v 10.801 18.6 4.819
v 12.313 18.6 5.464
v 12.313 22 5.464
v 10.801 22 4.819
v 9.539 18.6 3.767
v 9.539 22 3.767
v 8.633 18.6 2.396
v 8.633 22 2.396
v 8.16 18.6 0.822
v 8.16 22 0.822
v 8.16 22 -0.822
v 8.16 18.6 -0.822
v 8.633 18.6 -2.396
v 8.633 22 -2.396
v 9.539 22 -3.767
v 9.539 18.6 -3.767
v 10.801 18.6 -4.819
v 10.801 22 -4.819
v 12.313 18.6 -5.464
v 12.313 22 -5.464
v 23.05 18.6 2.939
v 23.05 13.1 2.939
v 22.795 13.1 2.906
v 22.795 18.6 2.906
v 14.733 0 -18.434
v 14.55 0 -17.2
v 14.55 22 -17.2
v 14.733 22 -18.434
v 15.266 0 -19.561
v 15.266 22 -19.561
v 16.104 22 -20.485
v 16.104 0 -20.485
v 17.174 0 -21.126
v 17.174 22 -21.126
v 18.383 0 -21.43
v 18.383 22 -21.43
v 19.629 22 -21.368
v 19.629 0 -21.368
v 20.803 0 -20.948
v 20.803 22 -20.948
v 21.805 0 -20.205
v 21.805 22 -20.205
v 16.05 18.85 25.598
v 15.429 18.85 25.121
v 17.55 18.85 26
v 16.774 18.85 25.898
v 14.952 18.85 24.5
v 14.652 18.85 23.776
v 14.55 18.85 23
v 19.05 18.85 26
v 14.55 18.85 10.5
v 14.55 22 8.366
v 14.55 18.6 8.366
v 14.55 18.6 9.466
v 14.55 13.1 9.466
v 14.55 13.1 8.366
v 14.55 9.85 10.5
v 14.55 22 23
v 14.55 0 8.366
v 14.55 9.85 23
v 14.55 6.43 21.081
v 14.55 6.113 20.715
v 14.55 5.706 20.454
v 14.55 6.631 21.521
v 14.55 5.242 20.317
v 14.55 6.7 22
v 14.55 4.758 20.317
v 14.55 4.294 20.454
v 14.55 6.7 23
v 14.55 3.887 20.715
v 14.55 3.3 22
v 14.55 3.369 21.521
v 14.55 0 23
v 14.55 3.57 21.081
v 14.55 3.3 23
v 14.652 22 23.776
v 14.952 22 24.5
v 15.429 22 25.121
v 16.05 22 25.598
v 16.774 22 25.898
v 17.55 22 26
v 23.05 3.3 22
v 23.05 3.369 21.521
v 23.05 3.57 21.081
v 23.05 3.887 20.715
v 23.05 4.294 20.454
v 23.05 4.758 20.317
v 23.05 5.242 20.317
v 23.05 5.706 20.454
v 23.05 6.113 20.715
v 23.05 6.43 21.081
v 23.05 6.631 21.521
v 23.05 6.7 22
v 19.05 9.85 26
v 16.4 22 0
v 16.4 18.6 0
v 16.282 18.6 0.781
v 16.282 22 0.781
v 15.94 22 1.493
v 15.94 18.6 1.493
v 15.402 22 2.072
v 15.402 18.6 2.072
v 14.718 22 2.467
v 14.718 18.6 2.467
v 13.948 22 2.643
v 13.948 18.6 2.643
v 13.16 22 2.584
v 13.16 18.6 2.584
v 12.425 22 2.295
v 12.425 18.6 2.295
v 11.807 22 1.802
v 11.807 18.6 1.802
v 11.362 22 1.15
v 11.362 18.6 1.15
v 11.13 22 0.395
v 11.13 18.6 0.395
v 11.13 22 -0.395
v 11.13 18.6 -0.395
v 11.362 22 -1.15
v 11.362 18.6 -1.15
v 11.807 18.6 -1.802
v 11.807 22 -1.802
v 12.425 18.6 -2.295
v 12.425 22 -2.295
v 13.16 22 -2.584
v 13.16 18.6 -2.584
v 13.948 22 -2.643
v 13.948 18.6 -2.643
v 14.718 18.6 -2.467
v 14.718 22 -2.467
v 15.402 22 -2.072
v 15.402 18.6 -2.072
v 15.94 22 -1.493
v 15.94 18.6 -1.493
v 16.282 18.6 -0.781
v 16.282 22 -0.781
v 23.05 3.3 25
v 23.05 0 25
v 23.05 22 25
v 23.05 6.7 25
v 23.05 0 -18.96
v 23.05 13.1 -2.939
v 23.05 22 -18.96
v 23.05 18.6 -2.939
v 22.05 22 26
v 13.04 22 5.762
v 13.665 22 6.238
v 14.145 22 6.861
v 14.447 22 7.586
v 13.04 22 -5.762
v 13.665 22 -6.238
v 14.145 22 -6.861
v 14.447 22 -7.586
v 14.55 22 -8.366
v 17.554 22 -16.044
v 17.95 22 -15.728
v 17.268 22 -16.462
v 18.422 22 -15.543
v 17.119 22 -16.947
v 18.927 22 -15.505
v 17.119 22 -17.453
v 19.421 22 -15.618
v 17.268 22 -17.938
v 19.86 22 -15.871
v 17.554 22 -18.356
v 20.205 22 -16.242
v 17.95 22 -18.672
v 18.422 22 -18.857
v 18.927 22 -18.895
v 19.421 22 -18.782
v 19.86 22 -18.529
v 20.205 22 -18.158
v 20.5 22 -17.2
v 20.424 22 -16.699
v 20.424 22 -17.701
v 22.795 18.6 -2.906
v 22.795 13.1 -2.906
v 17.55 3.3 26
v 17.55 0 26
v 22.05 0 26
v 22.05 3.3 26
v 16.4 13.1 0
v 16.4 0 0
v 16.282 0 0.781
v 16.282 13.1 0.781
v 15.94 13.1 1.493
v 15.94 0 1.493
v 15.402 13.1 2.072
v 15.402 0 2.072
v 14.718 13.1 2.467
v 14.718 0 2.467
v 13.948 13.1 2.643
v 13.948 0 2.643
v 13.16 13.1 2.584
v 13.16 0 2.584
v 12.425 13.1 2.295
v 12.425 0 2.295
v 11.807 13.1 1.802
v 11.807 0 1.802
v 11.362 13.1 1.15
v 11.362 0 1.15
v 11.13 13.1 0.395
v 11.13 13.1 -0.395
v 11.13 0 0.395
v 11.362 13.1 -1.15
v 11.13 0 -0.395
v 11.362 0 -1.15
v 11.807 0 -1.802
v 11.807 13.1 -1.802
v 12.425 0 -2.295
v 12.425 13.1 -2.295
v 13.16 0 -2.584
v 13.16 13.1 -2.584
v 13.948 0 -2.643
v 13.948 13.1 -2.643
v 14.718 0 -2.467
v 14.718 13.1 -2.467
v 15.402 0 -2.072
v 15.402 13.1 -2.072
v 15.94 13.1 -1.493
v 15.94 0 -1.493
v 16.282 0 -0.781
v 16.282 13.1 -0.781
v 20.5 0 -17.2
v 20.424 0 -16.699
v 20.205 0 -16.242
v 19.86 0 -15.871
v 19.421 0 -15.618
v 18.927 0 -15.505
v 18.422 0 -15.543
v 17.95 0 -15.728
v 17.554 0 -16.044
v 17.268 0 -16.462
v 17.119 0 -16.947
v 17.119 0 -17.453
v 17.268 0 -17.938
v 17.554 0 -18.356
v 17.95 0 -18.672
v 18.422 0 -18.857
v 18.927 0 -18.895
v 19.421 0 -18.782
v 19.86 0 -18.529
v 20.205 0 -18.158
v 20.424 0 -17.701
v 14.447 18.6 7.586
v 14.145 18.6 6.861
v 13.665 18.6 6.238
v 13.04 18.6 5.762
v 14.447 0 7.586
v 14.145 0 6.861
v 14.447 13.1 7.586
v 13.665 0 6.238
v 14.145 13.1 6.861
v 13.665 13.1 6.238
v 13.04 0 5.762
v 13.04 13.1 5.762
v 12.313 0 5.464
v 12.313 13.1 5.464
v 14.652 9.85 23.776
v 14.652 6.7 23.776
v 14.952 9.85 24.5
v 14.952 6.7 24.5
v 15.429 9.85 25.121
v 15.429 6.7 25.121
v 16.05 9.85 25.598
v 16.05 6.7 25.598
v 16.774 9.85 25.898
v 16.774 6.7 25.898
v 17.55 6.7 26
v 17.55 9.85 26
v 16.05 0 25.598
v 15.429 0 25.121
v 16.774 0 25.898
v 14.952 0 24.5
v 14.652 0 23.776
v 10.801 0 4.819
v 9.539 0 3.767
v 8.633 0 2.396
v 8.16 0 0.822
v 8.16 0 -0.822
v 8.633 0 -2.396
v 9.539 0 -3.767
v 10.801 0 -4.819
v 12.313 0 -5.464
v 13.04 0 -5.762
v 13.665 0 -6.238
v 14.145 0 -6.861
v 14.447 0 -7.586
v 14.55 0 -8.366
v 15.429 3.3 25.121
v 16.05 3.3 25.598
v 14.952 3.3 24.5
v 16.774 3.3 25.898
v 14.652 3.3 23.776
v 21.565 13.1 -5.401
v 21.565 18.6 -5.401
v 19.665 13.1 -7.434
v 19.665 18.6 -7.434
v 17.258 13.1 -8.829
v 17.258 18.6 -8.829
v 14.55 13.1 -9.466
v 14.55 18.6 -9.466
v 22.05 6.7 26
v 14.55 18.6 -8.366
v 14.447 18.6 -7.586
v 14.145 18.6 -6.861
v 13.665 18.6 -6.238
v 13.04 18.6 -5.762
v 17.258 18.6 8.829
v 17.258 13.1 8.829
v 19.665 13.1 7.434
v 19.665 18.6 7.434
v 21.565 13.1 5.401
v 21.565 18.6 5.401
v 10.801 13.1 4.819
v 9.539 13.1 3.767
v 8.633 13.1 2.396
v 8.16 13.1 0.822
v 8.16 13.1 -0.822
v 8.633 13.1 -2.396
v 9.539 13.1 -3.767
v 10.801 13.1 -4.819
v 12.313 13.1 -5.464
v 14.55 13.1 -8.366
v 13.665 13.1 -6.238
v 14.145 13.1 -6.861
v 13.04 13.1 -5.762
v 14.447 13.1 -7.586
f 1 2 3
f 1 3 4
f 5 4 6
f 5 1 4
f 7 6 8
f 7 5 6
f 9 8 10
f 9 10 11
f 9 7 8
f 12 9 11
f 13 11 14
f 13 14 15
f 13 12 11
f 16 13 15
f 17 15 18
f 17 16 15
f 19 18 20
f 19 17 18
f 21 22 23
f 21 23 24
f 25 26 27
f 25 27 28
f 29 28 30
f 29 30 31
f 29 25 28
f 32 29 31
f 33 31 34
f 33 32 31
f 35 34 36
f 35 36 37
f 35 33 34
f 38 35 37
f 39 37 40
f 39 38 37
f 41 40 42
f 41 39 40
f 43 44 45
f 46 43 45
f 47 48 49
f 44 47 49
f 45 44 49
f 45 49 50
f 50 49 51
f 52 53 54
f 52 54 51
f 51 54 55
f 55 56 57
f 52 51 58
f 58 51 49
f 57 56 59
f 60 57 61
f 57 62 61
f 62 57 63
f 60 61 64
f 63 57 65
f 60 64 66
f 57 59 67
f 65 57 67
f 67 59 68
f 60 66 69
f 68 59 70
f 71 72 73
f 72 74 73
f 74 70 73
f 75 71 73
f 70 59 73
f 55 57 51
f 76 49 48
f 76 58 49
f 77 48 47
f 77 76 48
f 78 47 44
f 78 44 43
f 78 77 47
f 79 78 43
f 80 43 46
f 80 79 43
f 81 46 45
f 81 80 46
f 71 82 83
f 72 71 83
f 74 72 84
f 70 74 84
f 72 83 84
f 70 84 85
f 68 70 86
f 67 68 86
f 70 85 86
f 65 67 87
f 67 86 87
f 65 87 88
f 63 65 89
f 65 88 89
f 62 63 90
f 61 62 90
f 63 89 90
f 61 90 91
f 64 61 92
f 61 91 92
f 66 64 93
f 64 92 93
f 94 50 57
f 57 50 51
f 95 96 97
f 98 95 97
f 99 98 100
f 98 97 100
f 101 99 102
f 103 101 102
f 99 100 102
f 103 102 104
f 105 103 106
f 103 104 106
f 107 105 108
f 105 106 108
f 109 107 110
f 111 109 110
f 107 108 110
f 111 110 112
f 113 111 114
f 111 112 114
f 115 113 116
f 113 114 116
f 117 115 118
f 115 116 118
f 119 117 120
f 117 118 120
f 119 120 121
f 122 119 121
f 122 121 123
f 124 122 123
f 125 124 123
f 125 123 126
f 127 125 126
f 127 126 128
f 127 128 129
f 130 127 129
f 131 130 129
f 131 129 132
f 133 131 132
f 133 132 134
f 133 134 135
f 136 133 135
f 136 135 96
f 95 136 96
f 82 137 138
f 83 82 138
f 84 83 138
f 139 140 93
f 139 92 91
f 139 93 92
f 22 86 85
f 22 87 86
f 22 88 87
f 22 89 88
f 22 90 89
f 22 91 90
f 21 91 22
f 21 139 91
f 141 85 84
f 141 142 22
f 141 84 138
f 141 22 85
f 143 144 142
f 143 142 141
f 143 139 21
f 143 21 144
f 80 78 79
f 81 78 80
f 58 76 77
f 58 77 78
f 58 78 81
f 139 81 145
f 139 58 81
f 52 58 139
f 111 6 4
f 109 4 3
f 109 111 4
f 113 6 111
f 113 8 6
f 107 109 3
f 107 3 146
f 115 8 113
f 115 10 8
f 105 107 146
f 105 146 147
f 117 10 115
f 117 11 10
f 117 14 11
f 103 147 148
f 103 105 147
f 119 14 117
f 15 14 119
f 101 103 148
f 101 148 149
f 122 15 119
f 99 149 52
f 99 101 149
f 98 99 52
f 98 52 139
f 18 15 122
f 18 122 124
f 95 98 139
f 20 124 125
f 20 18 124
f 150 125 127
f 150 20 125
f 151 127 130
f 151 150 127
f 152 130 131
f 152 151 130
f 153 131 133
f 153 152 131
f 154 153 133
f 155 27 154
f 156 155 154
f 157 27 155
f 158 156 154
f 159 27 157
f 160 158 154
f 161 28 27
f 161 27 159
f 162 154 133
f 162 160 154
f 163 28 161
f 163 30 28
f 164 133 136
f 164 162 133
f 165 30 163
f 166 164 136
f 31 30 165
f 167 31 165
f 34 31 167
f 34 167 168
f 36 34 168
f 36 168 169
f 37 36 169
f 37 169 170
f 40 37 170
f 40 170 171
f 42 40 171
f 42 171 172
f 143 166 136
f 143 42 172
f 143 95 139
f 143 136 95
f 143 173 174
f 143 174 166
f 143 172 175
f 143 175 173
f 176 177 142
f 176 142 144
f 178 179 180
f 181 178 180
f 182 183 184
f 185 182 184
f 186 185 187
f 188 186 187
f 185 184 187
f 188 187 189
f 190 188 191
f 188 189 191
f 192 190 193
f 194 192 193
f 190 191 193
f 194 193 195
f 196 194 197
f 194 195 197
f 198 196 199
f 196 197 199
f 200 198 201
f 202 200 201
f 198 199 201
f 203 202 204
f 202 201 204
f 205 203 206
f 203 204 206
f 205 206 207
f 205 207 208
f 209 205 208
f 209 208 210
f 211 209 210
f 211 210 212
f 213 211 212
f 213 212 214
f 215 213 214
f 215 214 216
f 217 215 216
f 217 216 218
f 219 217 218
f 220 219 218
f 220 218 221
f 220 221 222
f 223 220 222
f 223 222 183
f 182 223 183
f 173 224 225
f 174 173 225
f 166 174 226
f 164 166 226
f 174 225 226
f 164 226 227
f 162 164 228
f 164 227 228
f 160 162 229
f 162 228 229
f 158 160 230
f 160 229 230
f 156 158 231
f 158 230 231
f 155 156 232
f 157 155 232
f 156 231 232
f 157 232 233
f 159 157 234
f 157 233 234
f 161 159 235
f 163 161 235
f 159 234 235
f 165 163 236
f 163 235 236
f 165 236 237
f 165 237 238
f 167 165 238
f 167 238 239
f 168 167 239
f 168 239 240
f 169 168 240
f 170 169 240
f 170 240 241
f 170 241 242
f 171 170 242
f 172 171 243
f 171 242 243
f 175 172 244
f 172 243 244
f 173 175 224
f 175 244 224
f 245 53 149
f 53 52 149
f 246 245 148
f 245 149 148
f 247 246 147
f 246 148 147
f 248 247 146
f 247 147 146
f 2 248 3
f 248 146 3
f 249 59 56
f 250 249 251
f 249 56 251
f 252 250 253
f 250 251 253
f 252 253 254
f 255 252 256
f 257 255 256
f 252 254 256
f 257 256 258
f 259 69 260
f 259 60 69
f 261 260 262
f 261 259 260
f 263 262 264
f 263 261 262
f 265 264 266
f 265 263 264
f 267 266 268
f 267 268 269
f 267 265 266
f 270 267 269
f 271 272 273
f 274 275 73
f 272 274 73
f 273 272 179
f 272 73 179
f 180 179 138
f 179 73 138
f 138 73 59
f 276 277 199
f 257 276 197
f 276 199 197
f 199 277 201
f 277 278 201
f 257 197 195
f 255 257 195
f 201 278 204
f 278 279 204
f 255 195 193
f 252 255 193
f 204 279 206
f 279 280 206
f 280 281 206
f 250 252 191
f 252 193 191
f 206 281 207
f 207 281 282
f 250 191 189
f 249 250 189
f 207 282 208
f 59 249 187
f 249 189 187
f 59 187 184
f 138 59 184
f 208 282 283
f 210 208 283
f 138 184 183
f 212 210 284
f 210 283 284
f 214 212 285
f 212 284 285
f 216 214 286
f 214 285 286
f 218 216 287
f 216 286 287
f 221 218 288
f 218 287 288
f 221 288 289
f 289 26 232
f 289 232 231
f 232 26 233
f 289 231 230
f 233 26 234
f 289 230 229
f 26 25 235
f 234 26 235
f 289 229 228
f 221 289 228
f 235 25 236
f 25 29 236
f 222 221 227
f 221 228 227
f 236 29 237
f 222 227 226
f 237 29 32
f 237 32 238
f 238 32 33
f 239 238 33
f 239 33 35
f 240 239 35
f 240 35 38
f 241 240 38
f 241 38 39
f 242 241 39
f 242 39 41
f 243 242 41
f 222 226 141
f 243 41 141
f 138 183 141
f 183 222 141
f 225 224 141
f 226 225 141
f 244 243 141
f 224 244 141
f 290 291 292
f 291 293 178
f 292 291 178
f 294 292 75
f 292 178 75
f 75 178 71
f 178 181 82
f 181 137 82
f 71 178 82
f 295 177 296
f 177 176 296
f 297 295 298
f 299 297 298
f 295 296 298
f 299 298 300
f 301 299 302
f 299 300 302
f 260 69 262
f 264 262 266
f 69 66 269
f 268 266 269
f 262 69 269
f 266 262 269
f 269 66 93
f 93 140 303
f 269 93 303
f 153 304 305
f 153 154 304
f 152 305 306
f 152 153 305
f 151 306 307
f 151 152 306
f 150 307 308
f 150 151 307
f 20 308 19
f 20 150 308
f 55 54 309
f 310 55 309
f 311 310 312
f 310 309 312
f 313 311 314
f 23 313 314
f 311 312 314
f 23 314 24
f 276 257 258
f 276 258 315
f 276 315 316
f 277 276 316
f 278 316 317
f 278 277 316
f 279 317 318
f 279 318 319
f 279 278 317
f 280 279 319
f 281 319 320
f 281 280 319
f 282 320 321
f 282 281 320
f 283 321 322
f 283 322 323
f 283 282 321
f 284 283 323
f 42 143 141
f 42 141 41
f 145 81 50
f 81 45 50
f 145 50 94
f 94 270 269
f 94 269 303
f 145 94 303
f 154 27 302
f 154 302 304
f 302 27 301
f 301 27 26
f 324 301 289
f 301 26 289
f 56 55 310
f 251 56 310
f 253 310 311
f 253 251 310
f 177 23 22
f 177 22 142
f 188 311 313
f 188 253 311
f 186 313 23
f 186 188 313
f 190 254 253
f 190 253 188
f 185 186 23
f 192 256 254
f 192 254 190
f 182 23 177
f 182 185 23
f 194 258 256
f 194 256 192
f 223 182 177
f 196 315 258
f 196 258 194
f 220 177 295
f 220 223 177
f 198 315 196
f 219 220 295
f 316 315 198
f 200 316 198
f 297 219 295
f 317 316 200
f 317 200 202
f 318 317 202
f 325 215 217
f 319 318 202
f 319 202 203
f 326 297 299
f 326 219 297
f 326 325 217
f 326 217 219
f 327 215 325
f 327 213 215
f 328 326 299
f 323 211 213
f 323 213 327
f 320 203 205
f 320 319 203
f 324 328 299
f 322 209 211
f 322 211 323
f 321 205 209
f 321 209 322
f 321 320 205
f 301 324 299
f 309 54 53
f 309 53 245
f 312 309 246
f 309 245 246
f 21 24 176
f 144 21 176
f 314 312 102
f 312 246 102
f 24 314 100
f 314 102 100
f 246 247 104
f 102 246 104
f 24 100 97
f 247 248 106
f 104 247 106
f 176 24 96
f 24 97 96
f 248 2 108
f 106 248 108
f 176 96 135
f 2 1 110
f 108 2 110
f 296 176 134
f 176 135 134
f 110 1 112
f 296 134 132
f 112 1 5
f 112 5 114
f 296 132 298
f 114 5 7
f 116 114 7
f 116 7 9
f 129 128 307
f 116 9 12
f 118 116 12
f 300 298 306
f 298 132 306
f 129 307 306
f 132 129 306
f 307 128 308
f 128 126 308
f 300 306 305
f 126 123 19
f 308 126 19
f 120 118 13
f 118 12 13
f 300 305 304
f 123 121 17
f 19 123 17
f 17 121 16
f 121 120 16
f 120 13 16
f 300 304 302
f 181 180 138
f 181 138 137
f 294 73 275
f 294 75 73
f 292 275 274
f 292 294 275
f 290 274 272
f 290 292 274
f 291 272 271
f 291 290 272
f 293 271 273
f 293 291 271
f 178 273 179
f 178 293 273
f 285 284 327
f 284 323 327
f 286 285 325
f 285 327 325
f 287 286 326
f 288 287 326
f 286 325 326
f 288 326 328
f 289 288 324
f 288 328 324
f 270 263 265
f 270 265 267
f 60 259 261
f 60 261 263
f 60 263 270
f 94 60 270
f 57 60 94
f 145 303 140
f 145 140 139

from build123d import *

# Parameters (mm, degrees)
SKETCH054_R     = 1.7
SKETCH054_R_2   = 2.65
PAD016_DEPTH    = 22
SKETCH055_R     = 9.5
POCKET028_DEPTH = 2.75
POCKET029_DEPTH = 10
POCKET030_DEPTH = 4.5
PAD017_DEPTH    = 22
FILLET046_R     = 3
CHAMFER015_SIZE = 1


with BuildPart() as part:
    # Sketch054 → Pad016 (new body)
    with BuildSketch(Plane.XZ):
        with BuildLine():
            Line((14.55, -17.2), (14.55, -5.5930760767))
            ThreePointArc((14.55, 5.5930760767), (8.1, 0), (14.55, -5.5930760767))
            Line((14.55, 5.5930760767), (14.55, 26))
            Line((14.55, 26), (23.05, 26))
            Line((23.05, 26), (23.05, -17.2))
            ThreePointArc((14.55, -17.2), (18.8, -21.45), (23.05, -17.2))
        make_face()
        with Locations((18.8, -17.2)):
            Circle(SKETCH054_R, mode=Mode.SUBTRACT)
        with Locations((13.75, 0)):
            Circle(SKETCH054_R_2, mode=Mode.SUBTRACT)
    extrude(amount=-PAD016_DEPTH)

    # Sketch055 (on DatumPlane) → Pocket028 (cut, symmetric)
    with BuildSketch(Plane(origin=(6.25, 15.85, 0), x_dir=(0, 0, -1), z_dir=(0, 1, 0))):
        with Locations((0, -7.5)):
            Circle(SKETCH055_R)
    extrude(amount=POCKET028_DEPTH, both=True, mode=Mode.SUBTRACT)

    # Sketch056 (on Face12 of Pocket028) → Pocket029 (cut)
    with BuildSketch(Plane(origin=(23.05, 0, 0), x_dir=(0, 0, 1), z_dir=(1, 0, 0))):
        with BuildLine():
            Line((26, -3.3), (22, -3.3))
            ThreePointArc((22, -3.3), (20.3, -5), (22, -6.7))
            Line((22, -6.7), (26, -6.7))
            Line((26, -6.7), (26, -3.3))
        make_face()
    extrude(amount=-POCKET029_DEPTH, mode=Mode.SUBTRACT)

    # Sketch057 (on DatumPlane) → Pocket030 (cut, symmetric)
    with BuildSketch(Plane(origin=(0, 14.35, 0), x_dir=(1, 0, 0), z_dir=(0, 1, 0))):
        Polygon((14.55, -26), (19.05, -26), (14.55, -10.5), align=None)
    extrude(amount=POCKET030_DEPTH, both=True, mode=Mode.SUBTRACT)

    # Sketch058 (on Face8 of Pocket030) → Pad017 (join)
    with BuildSketch(Plane(origin=(0, 22, 0), x_dir=(1, 0, 0), z_dir=(0, 1, 0))):
        Polygon((23.05, 17.2), (23.05, 18.9604076401), (21.80520382, 20.20520382), align=None)
    extrude(amount=-PAD017_DEPTH)

    # Fillet046
    fillet046_edges = [part.edges().sort_by_distance(p)[0] for p in [
        (14.55, 1.65, 26),
        (14.55, 8.275, 26),
        (14.55, 20.425, 26),
        (14.55, 6.55, 5.593076),
        (14.55, 20.3, 5.593076),
        (14.55, 20.3, -5.593076),
        (14.55, 6.55, -5.593076),
    ]]
    fillet(fillet046_edges, radius=FILLET046_R)

    # Chamfer015
    chamfer015_edges = [part.edges().sort_by_distance(p)[0] for p in [
        (23.05, 1.65, 26),
        (23.05, 14.35, 26),
        (23.05, 15.85, 1.939072),
        (23.05, 15.85, -1.939072),
    ]]
    chamfer(chamfer015_edges, length=CHAMFER015_SIZE)


solid = part.part
